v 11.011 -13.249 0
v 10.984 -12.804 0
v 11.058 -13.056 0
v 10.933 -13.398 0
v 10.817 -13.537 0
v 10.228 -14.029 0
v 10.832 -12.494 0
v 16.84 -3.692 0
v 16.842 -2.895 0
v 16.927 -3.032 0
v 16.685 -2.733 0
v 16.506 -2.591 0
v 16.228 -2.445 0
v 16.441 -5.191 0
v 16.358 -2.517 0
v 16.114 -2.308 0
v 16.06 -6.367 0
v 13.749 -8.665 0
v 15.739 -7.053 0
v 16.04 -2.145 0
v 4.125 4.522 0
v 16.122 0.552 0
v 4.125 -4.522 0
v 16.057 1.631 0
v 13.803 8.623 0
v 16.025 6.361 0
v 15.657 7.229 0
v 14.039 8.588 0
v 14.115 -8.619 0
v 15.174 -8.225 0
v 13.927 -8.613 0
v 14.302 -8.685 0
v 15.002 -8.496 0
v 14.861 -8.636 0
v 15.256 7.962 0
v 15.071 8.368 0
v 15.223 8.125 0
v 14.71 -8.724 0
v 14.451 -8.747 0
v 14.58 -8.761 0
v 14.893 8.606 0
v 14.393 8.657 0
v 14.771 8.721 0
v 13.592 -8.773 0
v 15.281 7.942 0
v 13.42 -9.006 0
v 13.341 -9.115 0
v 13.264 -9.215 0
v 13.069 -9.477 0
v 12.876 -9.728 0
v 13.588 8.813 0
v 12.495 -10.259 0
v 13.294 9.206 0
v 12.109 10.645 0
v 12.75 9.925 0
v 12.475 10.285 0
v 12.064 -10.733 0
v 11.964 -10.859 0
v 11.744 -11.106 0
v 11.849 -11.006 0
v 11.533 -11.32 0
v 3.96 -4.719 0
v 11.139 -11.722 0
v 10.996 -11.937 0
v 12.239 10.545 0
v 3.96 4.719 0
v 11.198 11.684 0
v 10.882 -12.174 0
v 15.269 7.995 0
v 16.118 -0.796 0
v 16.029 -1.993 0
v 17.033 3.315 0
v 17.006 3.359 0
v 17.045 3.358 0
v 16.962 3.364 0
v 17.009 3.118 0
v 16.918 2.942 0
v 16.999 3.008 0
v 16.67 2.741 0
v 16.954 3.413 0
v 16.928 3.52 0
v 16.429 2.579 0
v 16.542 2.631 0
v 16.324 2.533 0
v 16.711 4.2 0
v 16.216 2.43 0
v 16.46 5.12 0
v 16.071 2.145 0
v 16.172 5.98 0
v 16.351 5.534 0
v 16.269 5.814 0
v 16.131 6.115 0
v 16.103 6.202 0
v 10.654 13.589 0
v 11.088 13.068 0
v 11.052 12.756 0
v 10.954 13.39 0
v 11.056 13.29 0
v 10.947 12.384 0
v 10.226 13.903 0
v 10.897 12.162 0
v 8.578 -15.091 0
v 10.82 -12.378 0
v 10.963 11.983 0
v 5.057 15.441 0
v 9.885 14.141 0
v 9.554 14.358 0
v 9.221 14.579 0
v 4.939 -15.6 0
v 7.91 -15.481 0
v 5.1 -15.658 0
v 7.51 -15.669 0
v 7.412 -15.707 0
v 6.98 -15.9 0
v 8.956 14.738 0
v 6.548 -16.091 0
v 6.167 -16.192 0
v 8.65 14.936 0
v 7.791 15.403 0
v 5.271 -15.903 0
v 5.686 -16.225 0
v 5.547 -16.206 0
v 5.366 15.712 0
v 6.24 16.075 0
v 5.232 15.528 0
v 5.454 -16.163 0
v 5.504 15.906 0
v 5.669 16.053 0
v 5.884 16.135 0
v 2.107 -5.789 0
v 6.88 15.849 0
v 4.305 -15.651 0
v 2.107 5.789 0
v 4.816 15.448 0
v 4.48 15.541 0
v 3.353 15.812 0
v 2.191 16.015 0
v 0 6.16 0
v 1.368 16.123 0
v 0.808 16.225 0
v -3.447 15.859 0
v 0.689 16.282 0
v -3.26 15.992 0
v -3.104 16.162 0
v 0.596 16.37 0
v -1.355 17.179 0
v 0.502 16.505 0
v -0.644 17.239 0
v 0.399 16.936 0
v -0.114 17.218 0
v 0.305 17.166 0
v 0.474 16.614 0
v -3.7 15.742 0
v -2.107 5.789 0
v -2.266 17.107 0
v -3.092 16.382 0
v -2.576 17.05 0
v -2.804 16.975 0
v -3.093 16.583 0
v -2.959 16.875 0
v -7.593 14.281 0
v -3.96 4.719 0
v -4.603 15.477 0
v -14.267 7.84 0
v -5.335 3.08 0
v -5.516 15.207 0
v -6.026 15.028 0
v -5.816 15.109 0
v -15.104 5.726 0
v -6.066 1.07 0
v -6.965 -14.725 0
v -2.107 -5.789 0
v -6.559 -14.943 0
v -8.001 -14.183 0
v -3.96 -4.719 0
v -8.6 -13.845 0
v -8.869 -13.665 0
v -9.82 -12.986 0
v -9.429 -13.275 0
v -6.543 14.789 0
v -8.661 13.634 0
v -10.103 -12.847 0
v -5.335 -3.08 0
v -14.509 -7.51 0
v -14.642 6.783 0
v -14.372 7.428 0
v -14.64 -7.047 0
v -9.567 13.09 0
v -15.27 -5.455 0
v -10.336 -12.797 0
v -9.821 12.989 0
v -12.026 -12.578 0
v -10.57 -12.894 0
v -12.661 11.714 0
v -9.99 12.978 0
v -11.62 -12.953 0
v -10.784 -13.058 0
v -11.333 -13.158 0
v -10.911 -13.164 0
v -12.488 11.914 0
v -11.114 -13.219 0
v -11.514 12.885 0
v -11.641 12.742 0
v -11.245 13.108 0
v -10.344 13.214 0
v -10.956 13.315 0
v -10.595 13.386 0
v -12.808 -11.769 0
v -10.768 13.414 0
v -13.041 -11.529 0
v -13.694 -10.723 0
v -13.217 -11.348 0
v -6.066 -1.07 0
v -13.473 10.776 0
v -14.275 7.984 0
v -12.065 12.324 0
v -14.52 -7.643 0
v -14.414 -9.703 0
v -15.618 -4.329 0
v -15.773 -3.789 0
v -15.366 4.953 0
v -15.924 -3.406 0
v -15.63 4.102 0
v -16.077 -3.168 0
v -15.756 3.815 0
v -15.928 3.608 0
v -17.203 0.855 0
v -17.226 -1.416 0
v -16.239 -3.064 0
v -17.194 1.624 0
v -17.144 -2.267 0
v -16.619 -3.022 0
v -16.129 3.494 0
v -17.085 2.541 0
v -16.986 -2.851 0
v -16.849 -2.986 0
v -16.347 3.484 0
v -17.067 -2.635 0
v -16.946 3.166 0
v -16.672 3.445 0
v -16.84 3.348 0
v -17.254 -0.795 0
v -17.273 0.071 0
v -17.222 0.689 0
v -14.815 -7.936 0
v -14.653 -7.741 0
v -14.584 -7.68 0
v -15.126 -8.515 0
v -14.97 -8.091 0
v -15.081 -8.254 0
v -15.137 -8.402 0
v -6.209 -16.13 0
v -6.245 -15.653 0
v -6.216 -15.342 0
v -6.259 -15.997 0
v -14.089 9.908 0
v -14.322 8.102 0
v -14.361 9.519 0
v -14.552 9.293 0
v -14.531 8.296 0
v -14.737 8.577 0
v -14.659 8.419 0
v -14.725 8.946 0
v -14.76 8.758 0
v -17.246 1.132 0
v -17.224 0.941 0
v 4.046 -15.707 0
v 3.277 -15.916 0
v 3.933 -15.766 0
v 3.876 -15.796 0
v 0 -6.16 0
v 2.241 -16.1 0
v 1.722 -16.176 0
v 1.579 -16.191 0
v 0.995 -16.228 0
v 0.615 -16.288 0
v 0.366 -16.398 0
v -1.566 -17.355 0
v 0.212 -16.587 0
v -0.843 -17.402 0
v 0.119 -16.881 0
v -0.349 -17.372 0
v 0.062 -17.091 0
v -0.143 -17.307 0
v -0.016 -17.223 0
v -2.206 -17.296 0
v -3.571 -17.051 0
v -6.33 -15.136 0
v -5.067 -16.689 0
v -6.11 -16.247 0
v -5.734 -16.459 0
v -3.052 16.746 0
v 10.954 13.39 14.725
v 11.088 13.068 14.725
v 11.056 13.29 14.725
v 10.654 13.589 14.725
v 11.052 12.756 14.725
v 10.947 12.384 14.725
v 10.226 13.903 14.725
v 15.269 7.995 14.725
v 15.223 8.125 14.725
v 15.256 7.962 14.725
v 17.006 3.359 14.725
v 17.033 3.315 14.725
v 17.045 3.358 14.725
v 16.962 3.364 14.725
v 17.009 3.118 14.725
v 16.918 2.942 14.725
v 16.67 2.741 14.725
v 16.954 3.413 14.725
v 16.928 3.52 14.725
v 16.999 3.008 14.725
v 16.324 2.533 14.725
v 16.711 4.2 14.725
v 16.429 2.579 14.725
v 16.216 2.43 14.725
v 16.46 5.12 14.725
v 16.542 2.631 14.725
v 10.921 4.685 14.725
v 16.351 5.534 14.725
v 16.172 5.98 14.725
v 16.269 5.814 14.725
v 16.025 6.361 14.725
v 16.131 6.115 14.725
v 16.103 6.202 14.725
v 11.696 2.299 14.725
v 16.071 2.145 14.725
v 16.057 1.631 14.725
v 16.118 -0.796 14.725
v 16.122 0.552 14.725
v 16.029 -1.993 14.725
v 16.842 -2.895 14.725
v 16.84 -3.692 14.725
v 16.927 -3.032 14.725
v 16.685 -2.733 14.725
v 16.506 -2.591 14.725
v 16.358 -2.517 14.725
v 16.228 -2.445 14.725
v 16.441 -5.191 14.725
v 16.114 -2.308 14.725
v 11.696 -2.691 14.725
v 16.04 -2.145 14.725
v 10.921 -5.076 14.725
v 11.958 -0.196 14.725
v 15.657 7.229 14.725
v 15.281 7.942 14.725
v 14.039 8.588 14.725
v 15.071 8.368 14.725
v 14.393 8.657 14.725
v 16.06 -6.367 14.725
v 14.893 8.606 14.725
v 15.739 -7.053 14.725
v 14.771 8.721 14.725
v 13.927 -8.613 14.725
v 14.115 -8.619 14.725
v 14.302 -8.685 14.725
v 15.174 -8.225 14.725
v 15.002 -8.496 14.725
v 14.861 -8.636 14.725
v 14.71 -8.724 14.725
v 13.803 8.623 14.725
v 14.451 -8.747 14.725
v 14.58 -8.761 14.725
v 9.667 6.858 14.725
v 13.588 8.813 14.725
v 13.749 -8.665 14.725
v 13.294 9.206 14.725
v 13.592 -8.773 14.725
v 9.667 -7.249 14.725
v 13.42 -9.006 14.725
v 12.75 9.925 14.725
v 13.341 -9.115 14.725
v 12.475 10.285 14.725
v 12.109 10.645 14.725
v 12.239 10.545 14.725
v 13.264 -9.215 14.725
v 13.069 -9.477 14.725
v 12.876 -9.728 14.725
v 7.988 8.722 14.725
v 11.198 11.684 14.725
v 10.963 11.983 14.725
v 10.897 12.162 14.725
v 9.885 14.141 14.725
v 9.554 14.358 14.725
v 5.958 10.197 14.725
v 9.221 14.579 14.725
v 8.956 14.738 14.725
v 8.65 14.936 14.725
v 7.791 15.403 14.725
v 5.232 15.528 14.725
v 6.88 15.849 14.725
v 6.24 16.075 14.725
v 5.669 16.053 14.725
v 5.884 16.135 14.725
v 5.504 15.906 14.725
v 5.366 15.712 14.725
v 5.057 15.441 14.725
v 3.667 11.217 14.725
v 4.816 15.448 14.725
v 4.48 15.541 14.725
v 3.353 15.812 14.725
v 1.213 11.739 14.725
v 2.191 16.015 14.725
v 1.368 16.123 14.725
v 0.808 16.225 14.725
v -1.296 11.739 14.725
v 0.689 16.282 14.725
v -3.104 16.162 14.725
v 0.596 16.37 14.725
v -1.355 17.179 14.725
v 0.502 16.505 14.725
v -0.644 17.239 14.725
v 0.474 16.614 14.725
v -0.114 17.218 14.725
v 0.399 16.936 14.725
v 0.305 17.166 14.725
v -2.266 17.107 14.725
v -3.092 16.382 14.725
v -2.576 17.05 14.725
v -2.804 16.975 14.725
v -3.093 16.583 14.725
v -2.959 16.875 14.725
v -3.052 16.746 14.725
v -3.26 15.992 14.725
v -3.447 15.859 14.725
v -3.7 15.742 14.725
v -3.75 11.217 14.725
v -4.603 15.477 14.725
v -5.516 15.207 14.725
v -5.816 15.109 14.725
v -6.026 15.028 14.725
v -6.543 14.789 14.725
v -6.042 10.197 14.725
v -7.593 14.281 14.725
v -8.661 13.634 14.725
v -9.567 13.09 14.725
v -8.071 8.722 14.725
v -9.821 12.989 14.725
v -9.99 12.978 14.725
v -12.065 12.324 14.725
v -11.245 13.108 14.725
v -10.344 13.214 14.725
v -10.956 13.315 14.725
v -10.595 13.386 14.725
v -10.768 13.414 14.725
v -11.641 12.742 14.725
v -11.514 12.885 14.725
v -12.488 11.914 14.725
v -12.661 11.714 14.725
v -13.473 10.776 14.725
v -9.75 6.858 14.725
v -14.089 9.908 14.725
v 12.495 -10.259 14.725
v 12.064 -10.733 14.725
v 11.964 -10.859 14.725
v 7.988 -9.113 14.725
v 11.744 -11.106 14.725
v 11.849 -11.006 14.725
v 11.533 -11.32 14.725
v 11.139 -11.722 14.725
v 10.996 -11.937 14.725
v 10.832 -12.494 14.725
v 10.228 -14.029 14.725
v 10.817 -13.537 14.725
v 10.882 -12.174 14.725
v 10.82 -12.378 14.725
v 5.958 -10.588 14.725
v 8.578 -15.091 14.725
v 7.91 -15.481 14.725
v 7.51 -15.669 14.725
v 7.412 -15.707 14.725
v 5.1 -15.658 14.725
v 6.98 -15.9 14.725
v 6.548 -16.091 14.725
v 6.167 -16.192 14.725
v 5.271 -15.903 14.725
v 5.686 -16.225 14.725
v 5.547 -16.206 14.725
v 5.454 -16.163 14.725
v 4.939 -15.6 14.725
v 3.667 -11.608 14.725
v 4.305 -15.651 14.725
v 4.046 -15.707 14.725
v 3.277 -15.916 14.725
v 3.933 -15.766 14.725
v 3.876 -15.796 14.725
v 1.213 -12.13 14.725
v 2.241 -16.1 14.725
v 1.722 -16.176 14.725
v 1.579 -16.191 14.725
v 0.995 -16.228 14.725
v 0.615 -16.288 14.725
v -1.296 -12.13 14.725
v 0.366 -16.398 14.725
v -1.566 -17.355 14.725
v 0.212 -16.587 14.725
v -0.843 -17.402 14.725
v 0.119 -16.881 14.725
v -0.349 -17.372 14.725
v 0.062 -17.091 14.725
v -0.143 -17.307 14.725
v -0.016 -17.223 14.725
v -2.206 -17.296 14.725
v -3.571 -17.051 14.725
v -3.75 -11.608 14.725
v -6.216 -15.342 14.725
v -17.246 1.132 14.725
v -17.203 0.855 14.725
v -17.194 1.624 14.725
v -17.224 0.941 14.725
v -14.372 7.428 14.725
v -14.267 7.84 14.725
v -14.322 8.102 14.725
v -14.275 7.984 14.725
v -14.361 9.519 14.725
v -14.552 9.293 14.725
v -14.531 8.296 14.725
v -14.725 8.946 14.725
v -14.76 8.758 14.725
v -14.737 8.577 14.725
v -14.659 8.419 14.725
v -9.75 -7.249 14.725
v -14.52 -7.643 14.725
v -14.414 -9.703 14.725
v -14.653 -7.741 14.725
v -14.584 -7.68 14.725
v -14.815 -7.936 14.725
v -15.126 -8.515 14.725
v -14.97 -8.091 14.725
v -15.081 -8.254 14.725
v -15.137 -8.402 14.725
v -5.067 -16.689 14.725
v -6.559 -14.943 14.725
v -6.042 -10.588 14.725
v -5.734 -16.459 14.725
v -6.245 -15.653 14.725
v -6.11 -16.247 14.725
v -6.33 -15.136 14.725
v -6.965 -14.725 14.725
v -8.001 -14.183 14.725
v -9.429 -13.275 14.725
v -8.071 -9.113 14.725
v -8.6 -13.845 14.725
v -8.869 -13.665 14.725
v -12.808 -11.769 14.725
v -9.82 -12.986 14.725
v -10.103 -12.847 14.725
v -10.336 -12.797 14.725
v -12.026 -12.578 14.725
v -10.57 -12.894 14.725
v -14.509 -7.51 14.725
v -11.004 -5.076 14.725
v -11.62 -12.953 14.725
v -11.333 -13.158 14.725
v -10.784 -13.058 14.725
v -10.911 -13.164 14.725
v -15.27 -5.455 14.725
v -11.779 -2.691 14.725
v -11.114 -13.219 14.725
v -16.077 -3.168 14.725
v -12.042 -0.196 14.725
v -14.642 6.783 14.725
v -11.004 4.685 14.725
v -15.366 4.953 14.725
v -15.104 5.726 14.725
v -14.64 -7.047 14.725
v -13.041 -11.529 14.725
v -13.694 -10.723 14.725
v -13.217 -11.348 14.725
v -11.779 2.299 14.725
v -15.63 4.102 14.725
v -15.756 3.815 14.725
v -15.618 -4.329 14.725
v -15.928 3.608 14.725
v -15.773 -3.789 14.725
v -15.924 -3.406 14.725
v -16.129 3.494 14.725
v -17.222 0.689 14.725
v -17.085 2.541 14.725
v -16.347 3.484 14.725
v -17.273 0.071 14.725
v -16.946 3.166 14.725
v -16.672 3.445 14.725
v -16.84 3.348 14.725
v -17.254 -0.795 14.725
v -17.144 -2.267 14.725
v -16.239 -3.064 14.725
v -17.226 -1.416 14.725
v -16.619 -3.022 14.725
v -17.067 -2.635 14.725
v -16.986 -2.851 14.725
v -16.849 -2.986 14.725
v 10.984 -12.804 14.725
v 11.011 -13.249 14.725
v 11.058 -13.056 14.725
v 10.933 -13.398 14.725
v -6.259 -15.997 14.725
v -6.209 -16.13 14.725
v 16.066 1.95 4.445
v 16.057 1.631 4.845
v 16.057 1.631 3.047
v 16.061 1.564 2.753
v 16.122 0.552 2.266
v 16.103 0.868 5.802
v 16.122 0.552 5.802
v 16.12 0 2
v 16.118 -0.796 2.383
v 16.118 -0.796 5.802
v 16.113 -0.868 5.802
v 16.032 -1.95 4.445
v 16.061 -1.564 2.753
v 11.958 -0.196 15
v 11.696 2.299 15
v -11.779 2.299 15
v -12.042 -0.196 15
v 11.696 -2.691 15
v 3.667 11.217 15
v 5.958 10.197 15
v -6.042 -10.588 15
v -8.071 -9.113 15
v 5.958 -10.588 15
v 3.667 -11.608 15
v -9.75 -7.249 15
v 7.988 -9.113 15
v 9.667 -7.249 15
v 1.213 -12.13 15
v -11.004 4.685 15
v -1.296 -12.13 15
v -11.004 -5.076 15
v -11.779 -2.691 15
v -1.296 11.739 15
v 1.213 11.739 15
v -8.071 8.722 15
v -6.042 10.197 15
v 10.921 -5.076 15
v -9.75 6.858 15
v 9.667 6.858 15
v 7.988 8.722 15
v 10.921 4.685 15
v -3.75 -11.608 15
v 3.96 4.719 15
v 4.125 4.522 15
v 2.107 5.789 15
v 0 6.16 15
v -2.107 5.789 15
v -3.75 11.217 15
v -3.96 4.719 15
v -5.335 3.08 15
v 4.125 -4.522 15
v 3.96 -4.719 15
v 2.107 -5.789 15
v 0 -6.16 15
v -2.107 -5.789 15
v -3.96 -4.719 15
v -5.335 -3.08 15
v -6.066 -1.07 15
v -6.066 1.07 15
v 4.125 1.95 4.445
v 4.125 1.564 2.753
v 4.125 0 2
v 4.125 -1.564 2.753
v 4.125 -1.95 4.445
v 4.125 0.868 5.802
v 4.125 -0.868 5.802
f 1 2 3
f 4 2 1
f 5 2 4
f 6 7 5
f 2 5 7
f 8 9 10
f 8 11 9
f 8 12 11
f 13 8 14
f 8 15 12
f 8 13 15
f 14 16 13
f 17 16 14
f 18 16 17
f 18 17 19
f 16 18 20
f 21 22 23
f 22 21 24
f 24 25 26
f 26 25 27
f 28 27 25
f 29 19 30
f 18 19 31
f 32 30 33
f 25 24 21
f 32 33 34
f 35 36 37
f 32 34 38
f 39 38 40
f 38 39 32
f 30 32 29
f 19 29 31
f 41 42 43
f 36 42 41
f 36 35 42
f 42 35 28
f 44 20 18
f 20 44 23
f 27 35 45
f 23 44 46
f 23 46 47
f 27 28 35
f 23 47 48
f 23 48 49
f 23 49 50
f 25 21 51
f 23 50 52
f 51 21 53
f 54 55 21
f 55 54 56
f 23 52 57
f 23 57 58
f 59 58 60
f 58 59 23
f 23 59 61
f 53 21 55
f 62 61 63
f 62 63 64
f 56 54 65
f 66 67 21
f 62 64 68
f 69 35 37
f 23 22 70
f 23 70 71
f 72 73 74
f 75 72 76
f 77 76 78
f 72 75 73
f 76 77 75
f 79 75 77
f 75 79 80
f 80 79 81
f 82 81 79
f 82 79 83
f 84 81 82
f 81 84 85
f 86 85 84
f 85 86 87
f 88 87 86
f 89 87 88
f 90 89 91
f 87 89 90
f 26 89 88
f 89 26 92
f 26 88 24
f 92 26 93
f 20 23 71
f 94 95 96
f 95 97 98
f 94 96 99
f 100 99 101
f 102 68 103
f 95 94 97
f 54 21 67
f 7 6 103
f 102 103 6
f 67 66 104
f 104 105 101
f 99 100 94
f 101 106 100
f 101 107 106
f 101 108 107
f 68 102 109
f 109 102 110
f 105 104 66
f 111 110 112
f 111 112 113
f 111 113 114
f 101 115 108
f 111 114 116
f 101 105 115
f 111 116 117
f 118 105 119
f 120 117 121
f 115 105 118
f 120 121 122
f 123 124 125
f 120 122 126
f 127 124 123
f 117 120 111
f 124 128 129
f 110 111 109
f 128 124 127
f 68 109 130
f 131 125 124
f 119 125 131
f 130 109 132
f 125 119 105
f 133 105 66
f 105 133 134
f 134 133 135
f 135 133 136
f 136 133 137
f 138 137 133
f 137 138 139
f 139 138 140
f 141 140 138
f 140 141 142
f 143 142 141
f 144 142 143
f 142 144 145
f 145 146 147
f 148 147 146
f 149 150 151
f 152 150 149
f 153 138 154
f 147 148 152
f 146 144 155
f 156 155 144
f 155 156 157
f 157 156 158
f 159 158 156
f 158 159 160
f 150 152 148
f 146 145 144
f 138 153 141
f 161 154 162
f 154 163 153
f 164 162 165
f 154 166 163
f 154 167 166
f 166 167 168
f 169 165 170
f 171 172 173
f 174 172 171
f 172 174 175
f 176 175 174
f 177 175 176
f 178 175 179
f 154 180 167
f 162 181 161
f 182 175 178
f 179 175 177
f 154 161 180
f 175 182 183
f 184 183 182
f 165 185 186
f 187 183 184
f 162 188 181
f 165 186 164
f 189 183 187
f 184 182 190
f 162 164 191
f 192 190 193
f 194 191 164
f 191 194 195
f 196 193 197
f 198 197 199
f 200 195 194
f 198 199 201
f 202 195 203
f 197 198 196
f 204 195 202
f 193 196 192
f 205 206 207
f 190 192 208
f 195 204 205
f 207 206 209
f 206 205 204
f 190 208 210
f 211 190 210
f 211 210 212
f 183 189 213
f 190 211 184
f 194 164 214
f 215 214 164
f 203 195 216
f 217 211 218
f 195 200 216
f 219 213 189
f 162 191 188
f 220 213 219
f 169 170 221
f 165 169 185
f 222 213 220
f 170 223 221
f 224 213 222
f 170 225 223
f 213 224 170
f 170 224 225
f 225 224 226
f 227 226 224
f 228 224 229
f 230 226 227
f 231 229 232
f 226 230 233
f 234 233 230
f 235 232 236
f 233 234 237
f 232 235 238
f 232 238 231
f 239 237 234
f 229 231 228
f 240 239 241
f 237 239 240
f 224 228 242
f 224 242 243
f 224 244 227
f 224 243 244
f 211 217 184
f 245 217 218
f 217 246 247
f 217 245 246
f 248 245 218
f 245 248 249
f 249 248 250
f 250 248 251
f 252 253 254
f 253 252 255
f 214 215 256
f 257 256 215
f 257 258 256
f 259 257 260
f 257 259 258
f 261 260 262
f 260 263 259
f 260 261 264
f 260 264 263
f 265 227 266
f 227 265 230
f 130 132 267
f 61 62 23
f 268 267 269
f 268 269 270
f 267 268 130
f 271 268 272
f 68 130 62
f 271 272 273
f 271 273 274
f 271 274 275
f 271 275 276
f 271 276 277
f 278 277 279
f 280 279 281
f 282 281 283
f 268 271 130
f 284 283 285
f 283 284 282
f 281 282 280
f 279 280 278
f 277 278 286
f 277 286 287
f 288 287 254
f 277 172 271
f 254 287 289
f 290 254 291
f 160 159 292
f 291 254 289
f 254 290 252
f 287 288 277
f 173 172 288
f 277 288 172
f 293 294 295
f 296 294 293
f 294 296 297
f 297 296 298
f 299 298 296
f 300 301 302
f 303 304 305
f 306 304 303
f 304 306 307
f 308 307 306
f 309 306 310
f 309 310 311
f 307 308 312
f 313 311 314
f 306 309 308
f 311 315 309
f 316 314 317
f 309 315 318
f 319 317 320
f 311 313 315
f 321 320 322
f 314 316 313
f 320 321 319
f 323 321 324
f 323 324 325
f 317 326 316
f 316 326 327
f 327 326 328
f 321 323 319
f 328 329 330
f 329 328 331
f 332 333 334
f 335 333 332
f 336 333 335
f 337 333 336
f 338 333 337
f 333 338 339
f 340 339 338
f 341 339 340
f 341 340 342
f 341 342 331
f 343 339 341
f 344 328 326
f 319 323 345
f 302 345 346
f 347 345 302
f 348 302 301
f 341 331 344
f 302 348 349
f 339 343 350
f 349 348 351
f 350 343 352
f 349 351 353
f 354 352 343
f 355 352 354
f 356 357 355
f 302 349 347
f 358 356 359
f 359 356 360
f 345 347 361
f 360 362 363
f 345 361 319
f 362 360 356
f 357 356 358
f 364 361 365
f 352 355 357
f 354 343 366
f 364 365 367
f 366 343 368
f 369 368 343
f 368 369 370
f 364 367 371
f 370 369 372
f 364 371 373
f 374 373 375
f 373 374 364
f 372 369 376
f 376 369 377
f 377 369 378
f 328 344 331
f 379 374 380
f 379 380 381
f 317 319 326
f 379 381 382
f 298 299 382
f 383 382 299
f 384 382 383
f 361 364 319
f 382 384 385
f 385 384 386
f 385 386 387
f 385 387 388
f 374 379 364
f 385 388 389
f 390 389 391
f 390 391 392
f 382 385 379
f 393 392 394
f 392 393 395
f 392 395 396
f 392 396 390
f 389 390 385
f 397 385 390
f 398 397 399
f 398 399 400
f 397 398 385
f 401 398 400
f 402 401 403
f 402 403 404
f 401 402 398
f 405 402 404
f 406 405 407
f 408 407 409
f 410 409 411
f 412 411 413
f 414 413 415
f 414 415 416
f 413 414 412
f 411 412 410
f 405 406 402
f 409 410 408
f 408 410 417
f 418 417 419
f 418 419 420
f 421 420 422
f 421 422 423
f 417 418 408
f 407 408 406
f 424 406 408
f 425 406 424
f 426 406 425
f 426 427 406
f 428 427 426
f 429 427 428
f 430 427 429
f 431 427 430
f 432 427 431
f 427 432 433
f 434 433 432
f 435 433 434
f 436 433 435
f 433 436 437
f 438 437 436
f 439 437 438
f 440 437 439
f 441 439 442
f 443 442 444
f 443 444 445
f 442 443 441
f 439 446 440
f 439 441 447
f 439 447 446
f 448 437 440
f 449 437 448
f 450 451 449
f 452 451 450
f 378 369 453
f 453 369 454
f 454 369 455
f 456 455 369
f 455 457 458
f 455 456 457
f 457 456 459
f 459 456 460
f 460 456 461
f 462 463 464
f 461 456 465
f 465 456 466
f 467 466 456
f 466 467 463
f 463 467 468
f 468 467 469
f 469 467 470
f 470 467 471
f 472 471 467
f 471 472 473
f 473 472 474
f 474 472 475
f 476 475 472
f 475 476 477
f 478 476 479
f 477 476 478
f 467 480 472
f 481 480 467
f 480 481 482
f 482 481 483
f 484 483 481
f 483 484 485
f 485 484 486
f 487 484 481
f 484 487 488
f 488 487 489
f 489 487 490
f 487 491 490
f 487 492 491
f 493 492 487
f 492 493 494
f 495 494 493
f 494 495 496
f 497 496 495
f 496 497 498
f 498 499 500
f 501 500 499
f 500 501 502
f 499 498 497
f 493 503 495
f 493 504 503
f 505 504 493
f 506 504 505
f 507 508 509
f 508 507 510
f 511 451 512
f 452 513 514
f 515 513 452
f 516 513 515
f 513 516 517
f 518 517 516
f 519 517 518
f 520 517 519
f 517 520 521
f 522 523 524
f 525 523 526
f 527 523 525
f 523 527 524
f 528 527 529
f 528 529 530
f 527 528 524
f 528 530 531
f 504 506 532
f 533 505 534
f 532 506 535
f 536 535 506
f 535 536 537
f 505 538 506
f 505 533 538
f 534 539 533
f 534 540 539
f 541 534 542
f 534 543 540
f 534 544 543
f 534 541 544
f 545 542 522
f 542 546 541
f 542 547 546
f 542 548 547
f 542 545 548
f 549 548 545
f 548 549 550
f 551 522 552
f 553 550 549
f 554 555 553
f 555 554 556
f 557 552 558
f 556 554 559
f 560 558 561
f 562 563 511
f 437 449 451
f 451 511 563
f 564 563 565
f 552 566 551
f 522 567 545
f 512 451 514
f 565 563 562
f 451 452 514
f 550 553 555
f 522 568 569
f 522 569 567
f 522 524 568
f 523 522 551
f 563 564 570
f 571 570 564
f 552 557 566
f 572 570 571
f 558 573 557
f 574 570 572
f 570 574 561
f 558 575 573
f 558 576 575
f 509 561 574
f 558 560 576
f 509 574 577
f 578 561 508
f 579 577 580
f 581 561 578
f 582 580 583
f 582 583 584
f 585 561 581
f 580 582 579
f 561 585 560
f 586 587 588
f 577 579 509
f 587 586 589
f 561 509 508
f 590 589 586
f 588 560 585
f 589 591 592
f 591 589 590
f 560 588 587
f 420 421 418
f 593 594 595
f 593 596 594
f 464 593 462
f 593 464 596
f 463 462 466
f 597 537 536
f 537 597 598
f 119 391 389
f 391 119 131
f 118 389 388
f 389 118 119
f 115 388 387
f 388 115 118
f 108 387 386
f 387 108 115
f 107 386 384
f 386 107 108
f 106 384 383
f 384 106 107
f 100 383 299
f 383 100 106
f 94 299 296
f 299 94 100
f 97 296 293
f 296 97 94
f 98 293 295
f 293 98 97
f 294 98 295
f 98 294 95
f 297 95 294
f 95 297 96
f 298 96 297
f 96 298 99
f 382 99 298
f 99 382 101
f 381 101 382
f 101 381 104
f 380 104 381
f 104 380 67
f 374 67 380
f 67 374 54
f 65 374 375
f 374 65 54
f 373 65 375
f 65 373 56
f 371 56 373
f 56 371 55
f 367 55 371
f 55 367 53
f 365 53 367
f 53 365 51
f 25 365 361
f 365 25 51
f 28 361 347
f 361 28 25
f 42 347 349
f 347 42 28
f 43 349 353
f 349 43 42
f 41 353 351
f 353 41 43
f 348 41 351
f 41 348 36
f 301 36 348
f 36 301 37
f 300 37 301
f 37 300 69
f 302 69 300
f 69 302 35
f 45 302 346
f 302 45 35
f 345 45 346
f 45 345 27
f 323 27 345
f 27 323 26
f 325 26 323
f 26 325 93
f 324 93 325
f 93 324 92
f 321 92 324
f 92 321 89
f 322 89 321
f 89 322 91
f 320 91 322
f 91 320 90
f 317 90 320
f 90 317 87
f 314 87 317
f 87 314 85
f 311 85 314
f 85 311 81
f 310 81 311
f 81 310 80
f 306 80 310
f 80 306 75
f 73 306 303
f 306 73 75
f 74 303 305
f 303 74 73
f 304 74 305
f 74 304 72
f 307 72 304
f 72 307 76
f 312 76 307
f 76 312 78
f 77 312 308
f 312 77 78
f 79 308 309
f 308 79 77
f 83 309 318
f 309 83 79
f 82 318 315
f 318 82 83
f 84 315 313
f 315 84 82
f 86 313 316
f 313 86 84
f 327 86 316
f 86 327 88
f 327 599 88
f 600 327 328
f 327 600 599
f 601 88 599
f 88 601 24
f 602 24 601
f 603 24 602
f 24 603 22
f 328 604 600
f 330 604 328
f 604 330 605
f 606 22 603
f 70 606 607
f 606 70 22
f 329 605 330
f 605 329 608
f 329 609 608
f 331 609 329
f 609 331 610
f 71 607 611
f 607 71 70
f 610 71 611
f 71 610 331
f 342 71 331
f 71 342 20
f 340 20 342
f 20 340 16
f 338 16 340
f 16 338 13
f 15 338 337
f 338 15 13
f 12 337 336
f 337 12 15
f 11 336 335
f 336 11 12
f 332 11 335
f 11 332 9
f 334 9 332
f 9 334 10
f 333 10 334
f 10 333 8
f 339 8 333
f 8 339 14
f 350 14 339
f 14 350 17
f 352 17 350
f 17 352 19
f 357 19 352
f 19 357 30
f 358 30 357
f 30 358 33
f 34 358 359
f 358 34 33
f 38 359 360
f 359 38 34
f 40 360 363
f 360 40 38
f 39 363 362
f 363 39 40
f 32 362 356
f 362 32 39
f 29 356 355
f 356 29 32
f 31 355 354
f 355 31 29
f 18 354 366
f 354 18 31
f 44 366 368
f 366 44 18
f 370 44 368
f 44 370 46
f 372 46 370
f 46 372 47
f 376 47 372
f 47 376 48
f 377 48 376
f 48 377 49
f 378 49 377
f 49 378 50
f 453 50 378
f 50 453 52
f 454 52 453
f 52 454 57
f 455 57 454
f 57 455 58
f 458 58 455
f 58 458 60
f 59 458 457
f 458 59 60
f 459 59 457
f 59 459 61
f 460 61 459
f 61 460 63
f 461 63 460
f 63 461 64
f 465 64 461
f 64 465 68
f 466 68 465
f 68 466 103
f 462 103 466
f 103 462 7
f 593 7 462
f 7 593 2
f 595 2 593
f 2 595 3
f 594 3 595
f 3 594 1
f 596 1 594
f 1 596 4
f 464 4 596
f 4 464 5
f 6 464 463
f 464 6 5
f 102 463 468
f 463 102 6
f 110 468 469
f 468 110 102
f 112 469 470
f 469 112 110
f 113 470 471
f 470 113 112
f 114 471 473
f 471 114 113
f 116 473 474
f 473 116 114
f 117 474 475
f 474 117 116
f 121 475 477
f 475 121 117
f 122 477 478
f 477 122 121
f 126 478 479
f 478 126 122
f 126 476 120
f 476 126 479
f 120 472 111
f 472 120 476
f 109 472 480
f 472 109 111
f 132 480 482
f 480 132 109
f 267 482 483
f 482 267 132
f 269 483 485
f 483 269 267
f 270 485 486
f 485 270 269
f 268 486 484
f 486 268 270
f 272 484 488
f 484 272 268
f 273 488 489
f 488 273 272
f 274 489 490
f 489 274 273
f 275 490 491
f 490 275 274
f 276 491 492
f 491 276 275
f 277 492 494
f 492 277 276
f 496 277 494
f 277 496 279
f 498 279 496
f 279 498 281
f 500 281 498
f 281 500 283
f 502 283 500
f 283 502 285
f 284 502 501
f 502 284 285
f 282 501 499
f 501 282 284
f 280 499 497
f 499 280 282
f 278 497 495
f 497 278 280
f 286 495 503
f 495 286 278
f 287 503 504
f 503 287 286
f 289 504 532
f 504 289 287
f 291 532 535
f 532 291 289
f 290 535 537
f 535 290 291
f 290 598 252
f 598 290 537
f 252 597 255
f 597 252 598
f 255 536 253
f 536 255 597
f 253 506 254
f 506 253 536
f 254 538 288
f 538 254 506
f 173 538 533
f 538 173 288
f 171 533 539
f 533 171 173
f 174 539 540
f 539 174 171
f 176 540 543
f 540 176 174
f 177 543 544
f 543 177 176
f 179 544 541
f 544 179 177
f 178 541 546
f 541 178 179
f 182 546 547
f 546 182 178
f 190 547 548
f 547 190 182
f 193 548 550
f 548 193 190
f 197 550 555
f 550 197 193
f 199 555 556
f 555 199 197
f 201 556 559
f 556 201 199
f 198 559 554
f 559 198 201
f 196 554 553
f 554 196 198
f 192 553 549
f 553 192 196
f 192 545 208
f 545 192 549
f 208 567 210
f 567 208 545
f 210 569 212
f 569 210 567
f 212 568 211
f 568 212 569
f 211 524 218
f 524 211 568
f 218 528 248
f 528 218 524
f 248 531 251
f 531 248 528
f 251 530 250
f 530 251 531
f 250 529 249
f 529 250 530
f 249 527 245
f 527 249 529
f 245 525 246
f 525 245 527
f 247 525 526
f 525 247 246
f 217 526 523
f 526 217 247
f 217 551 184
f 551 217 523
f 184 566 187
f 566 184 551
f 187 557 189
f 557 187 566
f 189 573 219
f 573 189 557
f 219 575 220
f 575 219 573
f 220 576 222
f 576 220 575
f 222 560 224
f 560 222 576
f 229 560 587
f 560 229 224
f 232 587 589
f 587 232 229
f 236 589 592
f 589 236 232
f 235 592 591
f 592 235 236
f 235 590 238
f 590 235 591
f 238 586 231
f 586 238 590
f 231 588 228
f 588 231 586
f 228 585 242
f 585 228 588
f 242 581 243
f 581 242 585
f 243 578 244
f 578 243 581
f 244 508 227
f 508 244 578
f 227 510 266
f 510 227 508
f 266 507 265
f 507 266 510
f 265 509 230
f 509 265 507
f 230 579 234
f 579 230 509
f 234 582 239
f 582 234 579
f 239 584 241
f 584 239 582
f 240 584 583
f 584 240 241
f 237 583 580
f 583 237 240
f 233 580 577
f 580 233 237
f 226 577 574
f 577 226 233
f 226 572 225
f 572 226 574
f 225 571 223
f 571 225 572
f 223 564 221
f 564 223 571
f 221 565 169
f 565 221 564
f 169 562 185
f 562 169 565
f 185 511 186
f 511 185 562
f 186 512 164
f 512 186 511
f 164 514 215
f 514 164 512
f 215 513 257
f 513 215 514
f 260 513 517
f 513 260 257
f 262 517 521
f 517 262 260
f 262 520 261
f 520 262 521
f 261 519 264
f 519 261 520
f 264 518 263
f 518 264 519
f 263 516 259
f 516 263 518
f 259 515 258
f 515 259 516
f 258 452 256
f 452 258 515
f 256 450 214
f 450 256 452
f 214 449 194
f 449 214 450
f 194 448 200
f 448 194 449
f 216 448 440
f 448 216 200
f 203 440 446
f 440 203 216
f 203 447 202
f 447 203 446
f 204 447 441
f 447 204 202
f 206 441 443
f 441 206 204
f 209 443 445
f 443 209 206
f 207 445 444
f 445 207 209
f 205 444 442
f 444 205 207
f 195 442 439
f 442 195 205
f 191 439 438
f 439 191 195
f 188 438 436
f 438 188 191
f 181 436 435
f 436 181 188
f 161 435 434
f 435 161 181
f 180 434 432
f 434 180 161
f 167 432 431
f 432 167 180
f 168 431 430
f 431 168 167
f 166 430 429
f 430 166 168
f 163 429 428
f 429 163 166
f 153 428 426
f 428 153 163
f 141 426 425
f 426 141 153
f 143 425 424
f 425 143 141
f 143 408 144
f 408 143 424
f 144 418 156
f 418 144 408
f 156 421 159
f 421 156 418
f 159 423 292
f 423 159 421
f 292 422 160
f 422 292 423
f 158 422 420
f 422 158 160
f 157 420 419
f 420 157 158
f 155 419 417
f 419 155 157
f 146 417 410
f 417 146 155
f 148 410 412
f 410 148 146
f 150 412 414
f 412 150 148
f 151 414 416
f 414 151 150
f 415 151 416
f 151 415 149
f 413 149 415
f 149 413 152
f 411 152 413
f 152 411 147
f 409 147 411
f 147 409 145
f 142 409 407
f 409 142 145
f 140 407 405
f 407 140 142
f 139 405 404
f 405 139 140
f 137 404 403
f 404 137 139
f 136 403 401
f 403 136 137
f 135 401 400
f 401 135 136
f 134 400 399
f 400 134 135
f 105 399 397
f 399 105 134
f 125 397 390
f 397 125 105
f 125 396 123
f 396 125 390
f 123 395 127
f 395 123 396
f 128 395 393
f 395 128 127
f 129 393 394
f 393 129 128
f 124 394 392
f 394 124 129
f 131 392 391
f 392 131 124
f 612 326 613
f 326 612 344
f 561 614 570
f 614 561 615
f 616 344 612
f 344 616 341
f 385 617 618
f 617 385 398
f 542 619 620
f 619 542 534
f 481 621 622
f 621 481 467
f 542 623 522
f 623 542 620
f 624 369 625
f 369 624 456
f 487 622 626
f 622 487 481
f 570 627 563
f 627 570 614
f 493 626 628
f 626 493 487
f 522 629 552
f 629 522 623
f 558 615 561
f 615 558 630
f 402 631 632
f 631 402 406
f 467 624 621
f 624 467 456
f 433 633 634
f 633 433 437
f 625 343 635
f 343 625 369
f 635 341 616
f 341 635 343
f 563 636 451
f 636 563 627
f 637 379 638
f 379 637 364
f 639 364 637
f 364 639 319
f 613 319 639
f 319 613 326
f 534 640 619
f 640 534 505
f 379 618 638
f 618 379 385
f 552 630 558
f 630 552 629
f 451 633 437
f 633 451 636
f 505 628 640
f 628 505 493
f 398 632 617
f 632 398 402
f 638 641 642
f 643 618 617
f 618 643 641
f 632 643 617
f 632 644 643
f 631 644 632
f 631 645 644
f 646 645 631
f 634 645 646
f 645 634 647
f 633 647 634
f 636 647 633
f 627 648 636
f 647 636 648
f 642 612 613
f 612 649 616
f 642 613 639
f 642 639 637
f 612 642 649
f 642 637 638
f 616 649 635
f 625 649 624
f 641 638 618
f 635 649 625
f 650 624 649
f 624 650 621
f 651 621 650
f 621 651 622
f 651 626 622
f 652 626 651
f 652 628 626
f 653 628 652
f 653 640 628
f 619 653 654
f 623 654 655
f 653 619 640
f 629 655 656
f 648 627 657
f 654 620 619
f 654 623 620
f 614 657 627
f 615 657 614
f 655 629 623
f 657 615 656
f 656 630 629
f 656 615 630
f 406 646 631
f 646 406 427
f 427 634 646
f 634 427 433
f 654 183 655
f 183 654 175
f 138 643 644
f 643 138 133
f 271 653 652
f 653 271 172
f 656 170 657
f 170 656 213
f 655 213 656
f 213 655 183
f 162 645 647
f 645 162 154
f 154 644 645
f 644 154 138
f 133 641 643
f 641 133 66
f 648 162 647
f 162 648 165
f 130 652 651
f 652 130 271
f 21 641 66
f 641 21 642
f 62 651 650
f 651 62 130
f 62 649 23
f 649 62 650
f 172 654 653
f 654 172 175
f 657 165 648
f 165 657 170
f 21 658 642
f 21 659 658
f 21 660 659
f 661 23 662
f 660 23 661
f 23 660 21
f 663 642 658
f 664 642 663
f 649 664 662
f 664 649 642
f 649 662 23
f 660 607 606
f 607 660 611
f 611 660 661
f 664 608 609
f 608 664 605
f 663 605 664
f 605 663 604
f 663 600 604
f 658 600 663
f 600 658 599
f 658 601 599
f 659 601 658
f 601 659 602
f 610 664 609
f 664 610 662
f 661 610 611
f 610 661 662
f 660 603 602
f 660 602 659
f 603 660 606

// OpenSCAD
// Module names are of the form poly_<inkscape-path-id>().  As a result,
// you can associate a polygon in this OpenSCAD program with the corresponding
// SVG element in the Inkscape document by looking for the XML element with
// the attribute id="inkscape-path-id".

// fudge value is used to ensure that subtracted solids are a tad taller
// in the z dimension than the polygon being subtracted from.  This helps
// keep the resulting .stl file manifold.
fudge = 0.1;

module poly_path3386(h)
{
  scale([25.4/90, -25.4/90, 1]) union()
  {
    difference()
    {
       linear_extrude(height=h)
         polygon([[-33.987888,392.697738],[-49.999310,390.711858],[-59.408529,387.759464],[-62.169828,385.621300],[-63.919597,382.882078],[-65.236568,375.121218],[-66.075386,368.025598],[-69.612998,363.966368],[-75.641290,360.729031],[-85.746118,357.799868],[-111.487888,350.589118],[-126.487888,345.885178],[-133.362888,343.136938],[-147.737888,337.085178],[-157.863998,332.485828],[-164.846488,330.701288],[-170.294780,330.708022],[-175.074868,333.991018],[-179.072268,338.673768],[-181.414938,341.632408],[-185.685749,343.830842],[-190.868628,343.507162],[-198.252756,340.299062],[-209.127318,333.844238],[-230.448268,319.469238],[-236.816338,315.216468],[-241.605968,311.992958],[-255.237888,300.282038],[-276.197684,280.902674],[-297.748008,257.716468],[-298.530303,255.253976],[-297.985943,251.665674],[-296.274140,247.498817],[-293.554108,243.300658],[-290.862888,238.172888],[-289.612888,236.466468],[-288.346295,235.346986],[-288.737353,232.323879],[-293.874928,222.578828],[-315.508307,189.979131],[-328.660668,166.464348],[-334.679480,155.121539],[-339.878817,147.272869],[-344.441620,142.685292],[-348.550827,141.125758],[-357.238139,141.989078],[-362.568678,142.272016],[-366.253002,139.918628],[-369.103974,135.468962],[-372.568990,127.608501],[-378.458152,108.966468],[-382.039590,95.216468],[-386.570862,75.937019],[-388.362674,61.883128],[-388.726847,58.082357],[-389.602112,56.258128],[-391.015580,52.091468],[-392.189853,40.841468],[-394.100952,19.812536],[-393.980025,5.169928],[-392.459216,0.609433],[-389.174474,-2.373812],[-382.078520,-4.778852],[-377.267507,-6.033233],[-373.305582,-9.551489],[-370.455026,-14.988789],[-368.978122,-22.000302],[-367.142514,-42.283532],[-364.946418,-60.813713],[-359.644638,-86.658532],[-356.658329,-102.349650],[-356.277549,-112.058453],[-357.144447,-115.253946],[-358.758987,-117.655211],[-364.359335,-121.010192],[-367.800635,-123.147476],[-370.286114,-126.319423],[-371.661458,-130.242452],[-371.772355,-134.632982],[-369.555734,-143.205617],[-366.366540,-149.158532],[-362.128939,-159.158532],[-352.481307,-181.485303],[-338.773760,-206.321192],[-335.862888,-211.619542],[-328.362888,-222.808232],[-320.862888,-234.171412],[-318.701653,-237.972675],[-313.739350,-244.218646],[-308.258081,-250.230726],[-304.539948,-253.330322],[-300.524921,-253.523447],[-294.107398,-250.884992],[-285.055768,-247.283532],[-281.342092,-248.322538],[-276.132718,-251.803957],[-258.457168,-268.280432],[-237.668561,-287.813311],[-216.589368,-304.158532],[-206.175438,-311.969502],[-201.863048,-314.782006],[-195.613048,-318.384906],[-176.487888,-328.778513],[-157.554116,-338.984662],[-152.454413,-342.806714],[-148.903618,-346.657918],[-146.227438,-351.212924],[-147.007528,-356.174767],[-147.980833,-360.671210],[-147.839054,-364.505963],[-146.374777,-367.833411],[-143.380588,-370.807942],[-138.649072,-373.583940],[-131.972817,-376.315793],[-111.956428,-382.264607],[-96.331428,-386.989347],[-84.376198,-389.037092],[-74.764528,-389.874043],[-71.563698,-385.163620],[-68.362888,-378.328482],[-67.222176,-376.015643],[-64.479608,-373.438631],[-61.985849,-371.922180],[-59.053443,-371.206801],[-46.042108,-371.596801],[-27.112888,-373.080517],[-0.174899,-374.079236],[26.316772,-373.378646],[34.262300,-372.876069],[39.695595,-373.884667],[43.189146,-376.646225],[45.315442,-381.402528],[47.481279,-386.406379],[50.460362,-390.478716],[54.883834,-393.323097],[63.140352,-393.666307],[78.512112,-391.668918],[101.012112,-386.023358],[122.438302,-379.673143],[130.204252,-376.693748],[136.903062,-374.385826],[145.387112,-371.033532],[153.824612,-367.761976],[162.574612,-364.062149],[173.637002,-359.062149],[181.305742,-356.033532],[184.043617,-354.282157],[185.819957,-349.486589],[186.493708,-342.334663],[185.923812,-333.514213],[185.856340,-328.301367],[188.189602,-324.624654],[194.854652,-319.062196],[220.163902,-300.145732],[223.550902,-298.533532],[230.072402,-293.846032],[237.935402,-287.099502],[253.512112,-273.610492],[261.945906,-266.212899],[267.661434,-262.993267],[273.095571,-263.319133],[280.685192,-266.558032],[288.844482,-269.783532],[292.121154,-267.792961],[297.220829,-263.319239],[301.780198,-258.609354],[303.435952,-255.910292],[303.295944,-255.114517],[303.937232,-254.783532],[315.745882,-240.621644],[328.084902,-222.973622],[330.587762,-219.783532],[331.637112,-217.970642],[333.199612,-215.158142],[336.146670,-211.890367],[339.305722,-206.033532],[343.711952,-197.283532],[353.700972,-177.908532],[361.785692,-163.741872],[362.887112,-161.480592],[363.290995,-160.413157],[364.299272,-160.508762],[365.163542,-160.673747],[365.103752,-159.645032],[365.520872,-155.134892],[365.820871,-152.622646],[364.319842,-150.759892],[359.720102,-145.094432],[357.384580,-142.015011],[355.102952,-140.318342],[352.964857,-138.790648],[351.048642,-135.973866],[349.151872,-128.908112],[351.299975,-117.356137],[357.863222,-93.533532],[364.197575,-63.379653],[367.887112,-36.197342],[368.854739,-32.841599],[371.287934,-29.544194],[374.482170,-27.032411],[377.732922,-26.033532],[381.391420,-25.082045],[386.064132,-22.762623],[390.366923,-19.877823],[392.915652,-17.230202],[394.100952,-2.053212],[392.307452,33.356571],[389.362822,61.466468],[385.449962,78.341468],[378.388502,107.226396],[375.838083,114.104678],[373.343672,117.892278],[370.376340,120.591025],[367.645231,122.023864],[364.698150,122.329223],[361.082902,121.645528],[356.582250,121.076053],[352.351451,121.830888],[348.623518,123.829426],[345.631462,126.991058],[342.887112,133.032538],[341.637112,135.841468],[340.387112,138.440078],[337.262112,145.216468],[334.137112,151.744528],[328.143839,165.435862],[320.781192,178.091078],[319.137112,181.375528],[317.262112,185.216468],[315.387112,187.942818],[311.684162,193.727268],[304.789602,204.591468],[302.602607,210.094453],[301.189431,215.933839],[300.776791,220.782478],[301.591402,223.313218],[306.461342,229.524908],[309.310295,234.804256],[309.192742,239.344808],[308.145957,243.047161],[306.214850,246.708069],[295.387112,260.520288],[263.520422,292.091468],[250.458152,303.987729],[242.398202,310.091388],[240.387112,311.407318],[231.637112,317.782388],[222.887112,324.118938],[214.865227,328.168506],[204.255962,331.207718],[201.056942,331.432934],[198.779370,330.922332],[193.453362,325.984268],[188.468610,321.307977],[184.584512,320.779658],[170.650860,324.930919],[165.120474,327.416670],[162.887112,329.261348],[161.738622,330.216468],[148.926122,335.732308],[126.637112,344.774008],[115.387112,348.945668],[112.262112,349.962968],[99.385522,353.567898],[91.160241,356.705014],[86.116402,360.368411],[83.582521,365.321631],[82.887112,372.328218],[82.624029,377.293749],[81.508472,380.619268],[79.050986,383.100175],[74.762112,385.531868],[63.867735,388.561793],[47.461562,390.937928],[32.887112,392.663488],[1.199152,393.666307],[-33.987888,392.697788]]);
       translate([0, 0, -fudge])
         linear_extrude(height=h+2*fudge)
           polygon([[26.252372,105.125118],[34.690422,103.966468],[39.035151,103.455062],[41.637112,102.091468],[44.882602,100.216468],[56.487952,95.216468],[67.166562,90.216468],[73.318872,84.591468],[77.739067,80.618812],[80.797832,78.966468],[82.273385,78.428606],[82.887112,77.135448],[83.571600,75.475957],[85.217272,74.057358],[93.281489,66.966307],[99.137112,60.010518],[101.620332,58.966468],[103.913926,57.923144],[105.848382,54.903968],[110.552662,47.740608],[113.199612,43.678108],[115.387112,40.216468],[117.887112,35.816628],[121.028092,26.186788],[123.590945,17.601082],[124.895312,7.152608],[126.260462,-5.185372],[127.153307,-13.654833],[125.809472,-23.373682],[124.137112,-31.860982],[121.814202,-40.770832],[117.276502,-52.569262],[115.392917,-57.429122],[113.974422,-59.057982],[113.160612,-59.155836],[112.730862,-60.334762],[110.315122,-68.138792],[108.515207,-71.113213],[106.524462,-72.675182],[104.366632,-74.489284],[102.165002,-78.069922],[95.235152,-87.908532],[84.957959,-99.184096],[81.637112,-103.757322],[75.765345,-107.349189],[64.449612,-112.390792],[61.637112,-114.826372],[61.261959,-115.551272],[60.359982,-115.391772],[57.649685,-115.947016],[52.926822,-118.390332],[43.651959,-122.414063],[31.373902,-125.422209],[17.831128,-127.099320],[4.762112,-127.129942],[-20.711670,-123.990051],[-29.596237,-121.629860],[-36.698118,-118.580862],[-44.833098,-116.033532],[-48.999588,-114.764592],[-53.955438,-111.752642],[-58.197253,-109.215908],[-62.755159,-105.336239],[-66.757669,-100.954667],[-69.333298,-96.912222],[-70.862888,-89.974722],[-72.136328,-85.260092],[-75.854488,-75.947592],[-81.456048,-58.682412],[-84.612888,-45.494912],[-86.145818,-40.000612],[-87.951618,-33.188112],[-89.106696,-24.313042],[-91.043118,-19.713512],[-92.379448,-15.651012],[-93.596288,-12.283532],[-93.797048,-10.361972],[-93.829575,-8.375973],[-94.943168,-6.299472],[-97.455118,0.216468],[-98.952438,7.716468],[-101.878959,20.100288],[-102.687098,30.113118],[-102.334379,36.258386],[-101.175388,38.654778],[-99.612888,40.751908],[-97.112888,44.591468],[-94.612888,48.535208],[-94.022825,49.722593],[-92.604148,50.216468],[-91.288903,50.726058],[-91.384288,52.272238],[-91.301995,54.309300],[-90.144711,56.507019],[-88.497601,58.078843],[-86.945828,58.238218],[-86.179178,58.429774],[-85.856678,59.830188],[-82.641258,65.841468],[-80.662133,67.941041],[-80.410348,67.722978],[-78.453734,69.050904],[-72.375758,74.867378],[-63.362888,84.872678],[-60.732088,87.508068],[-58.943494,88.406549],[-59.031078,87.646578],[-59.265019,86.685833],[-58.224388,86.720968],[-56.331638,88.758128],[-56.019138,91.558118],[-55.266183,92.370482],[-53.675388,92.439588],[-51.507370,92.807327],[-49.366728,94.337708],[-47.543320,95.802187],[-46.138038,96.011518],[-40.554598,98.368488],[-35.916154,100.702139],[-31.049478,102.041838],[-20.868158,104.735208],[-15.120311,106.168498],[-7.976978,106.130408],[2.887112,106.531908],[14.224757,106.932697],[26.252372,105.125118]]);
    }
  }
}

height = 95;

module pignon(h, s=.155)
{
scale([s,s,s])
poly_path3386(h);
}
ext_radius = 34.6/2;

module dents(){
rotate([0,0,-12])
translate([0,-.2,0]){
    union()
    {
        cylindre(12,15);
        pignon(height);
    }
}
}


module cylindre(r, h=1){
linear_extrude(height=h)
    circle(r);
}

module carreau(r, h=1){
linear_extrude(height=h)
    square(r,center=true);
}

module axe(sca=1.10, h=40)
{
    scale([sca, sca, sca])
    rotate([0,0,90])
    difference(){
        cylindre(5.6,h);
        translate([0,-8.6,0]){
        carreau(9.7,h);
        }
        
    }
}

difference()
{
    difference(){
        dents();
        axe();
    };
    translate([0,0,4])
        rotate([0,90,0])
            cylindre(r=2,h=35);
}
//cercle(ext_radius);
